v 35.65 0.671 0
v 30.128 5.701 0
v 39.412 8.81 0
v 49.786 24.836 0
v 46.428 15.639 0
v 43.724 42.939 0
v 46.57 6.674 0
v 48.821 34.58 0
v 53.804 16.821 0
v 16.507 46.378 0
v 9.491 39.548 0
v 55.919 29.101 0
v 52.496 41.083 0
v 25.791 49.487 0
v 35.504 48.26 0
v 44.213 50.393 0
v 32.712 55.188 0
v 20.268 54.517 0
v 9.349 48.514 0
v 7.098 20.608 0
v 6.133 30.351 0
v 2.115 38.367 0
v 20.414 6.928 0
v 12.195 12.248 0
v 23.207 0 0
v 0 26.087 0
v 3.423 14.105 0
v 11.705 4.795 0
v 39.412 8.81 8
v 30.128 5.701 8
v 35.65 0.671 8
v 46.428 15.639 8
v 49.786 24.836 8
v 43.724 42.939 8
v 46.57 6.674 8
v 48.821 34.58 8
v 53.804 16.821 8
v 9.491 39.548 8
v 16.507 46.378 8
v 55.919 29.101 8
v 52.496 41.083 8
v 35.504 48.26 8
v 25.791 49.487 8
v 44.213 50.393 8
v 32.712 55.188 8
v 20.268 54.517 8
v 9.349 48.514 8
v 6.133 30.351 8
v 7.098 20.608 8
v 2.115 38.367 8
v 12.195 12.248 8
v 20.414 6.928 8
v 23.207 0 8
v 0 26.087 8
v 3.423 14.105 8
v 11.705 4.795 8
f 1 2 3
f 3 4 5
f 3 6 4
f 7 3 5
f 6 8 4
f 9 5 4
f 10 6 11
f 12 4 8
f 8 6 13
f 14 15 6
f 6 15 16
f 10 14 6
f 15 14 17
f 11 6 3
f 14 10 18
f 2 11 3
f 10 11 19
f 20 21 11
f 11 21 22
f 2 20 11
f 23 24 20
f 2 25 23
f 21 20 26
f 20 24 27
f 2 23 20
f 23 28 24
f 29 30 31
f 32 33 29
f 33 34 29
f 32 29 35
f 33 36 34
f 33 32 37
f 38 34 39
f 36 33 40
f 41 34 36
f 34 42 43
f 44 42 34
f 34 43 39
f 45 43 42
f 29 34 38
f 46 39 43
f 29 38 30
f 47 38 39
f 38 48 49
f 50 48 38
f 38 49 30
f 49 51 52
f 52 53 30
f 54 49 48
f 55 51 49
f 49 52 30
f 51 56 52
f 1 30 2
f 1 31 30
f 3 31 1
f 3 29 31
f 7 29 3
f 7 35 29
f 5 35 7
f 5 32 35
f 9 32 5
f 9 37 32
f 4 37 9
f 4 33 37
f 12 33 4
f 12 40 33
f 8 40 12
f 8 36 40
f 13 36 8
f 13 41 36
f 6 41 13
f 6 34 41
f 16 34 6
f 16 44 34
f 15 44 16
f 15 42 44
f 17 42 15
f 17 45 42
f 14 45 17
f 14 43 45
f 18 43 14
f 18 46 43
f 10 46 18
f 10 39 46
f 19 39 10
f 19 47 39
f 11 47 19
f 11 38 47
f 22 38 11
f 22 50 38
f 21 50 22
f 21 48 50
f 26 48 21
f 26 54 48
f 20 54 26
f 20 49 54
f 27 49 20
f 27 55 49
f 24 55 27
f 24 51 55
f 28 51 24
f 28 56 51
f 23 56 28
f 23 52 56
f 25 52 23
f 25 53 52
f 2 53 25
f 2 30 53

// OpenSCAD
$fn = 32;

// ----------------------------------------------------------------------
// Chain sprocket: 14 teeth, 22 mm root radius
// ----------------------------------------------------------------------

// --- parameters (mm) ---
profile_height = 8;       // extrusion height
profile_points = 28;      // points of the closed outline

profile = [[49.786, 24.836], [55.919, 29.101], [48.821, 34.58], [52.496, 41.083], [43.724, 42.939], [44.213, 50.393], [35.504, 48.26], [32.712, 55.188], [25.791, 49.487], [20.268, 54.517], [16.507, 46.378], [9.349, 48.514], [9.491, 39.548], [2.115, 38.367], [6.133, 30.351], [0, 26.087], [7.098, 20.608], [3.423, 14.105], [12.195, 12.248], [11.705, 4.795], [20.414, 6.928], [23.207, 0], [30.128, 5.701], [35.65, 0.671], [39.412, 8.81], [46.57, 6.674], [46.428, 15.639], [53.804, 16.821]];  // single closed polygon, 28 points, counter clockwise

// --- the one profile operation ---
linear_extrude(height = profile_height) polygon(points = profile);
